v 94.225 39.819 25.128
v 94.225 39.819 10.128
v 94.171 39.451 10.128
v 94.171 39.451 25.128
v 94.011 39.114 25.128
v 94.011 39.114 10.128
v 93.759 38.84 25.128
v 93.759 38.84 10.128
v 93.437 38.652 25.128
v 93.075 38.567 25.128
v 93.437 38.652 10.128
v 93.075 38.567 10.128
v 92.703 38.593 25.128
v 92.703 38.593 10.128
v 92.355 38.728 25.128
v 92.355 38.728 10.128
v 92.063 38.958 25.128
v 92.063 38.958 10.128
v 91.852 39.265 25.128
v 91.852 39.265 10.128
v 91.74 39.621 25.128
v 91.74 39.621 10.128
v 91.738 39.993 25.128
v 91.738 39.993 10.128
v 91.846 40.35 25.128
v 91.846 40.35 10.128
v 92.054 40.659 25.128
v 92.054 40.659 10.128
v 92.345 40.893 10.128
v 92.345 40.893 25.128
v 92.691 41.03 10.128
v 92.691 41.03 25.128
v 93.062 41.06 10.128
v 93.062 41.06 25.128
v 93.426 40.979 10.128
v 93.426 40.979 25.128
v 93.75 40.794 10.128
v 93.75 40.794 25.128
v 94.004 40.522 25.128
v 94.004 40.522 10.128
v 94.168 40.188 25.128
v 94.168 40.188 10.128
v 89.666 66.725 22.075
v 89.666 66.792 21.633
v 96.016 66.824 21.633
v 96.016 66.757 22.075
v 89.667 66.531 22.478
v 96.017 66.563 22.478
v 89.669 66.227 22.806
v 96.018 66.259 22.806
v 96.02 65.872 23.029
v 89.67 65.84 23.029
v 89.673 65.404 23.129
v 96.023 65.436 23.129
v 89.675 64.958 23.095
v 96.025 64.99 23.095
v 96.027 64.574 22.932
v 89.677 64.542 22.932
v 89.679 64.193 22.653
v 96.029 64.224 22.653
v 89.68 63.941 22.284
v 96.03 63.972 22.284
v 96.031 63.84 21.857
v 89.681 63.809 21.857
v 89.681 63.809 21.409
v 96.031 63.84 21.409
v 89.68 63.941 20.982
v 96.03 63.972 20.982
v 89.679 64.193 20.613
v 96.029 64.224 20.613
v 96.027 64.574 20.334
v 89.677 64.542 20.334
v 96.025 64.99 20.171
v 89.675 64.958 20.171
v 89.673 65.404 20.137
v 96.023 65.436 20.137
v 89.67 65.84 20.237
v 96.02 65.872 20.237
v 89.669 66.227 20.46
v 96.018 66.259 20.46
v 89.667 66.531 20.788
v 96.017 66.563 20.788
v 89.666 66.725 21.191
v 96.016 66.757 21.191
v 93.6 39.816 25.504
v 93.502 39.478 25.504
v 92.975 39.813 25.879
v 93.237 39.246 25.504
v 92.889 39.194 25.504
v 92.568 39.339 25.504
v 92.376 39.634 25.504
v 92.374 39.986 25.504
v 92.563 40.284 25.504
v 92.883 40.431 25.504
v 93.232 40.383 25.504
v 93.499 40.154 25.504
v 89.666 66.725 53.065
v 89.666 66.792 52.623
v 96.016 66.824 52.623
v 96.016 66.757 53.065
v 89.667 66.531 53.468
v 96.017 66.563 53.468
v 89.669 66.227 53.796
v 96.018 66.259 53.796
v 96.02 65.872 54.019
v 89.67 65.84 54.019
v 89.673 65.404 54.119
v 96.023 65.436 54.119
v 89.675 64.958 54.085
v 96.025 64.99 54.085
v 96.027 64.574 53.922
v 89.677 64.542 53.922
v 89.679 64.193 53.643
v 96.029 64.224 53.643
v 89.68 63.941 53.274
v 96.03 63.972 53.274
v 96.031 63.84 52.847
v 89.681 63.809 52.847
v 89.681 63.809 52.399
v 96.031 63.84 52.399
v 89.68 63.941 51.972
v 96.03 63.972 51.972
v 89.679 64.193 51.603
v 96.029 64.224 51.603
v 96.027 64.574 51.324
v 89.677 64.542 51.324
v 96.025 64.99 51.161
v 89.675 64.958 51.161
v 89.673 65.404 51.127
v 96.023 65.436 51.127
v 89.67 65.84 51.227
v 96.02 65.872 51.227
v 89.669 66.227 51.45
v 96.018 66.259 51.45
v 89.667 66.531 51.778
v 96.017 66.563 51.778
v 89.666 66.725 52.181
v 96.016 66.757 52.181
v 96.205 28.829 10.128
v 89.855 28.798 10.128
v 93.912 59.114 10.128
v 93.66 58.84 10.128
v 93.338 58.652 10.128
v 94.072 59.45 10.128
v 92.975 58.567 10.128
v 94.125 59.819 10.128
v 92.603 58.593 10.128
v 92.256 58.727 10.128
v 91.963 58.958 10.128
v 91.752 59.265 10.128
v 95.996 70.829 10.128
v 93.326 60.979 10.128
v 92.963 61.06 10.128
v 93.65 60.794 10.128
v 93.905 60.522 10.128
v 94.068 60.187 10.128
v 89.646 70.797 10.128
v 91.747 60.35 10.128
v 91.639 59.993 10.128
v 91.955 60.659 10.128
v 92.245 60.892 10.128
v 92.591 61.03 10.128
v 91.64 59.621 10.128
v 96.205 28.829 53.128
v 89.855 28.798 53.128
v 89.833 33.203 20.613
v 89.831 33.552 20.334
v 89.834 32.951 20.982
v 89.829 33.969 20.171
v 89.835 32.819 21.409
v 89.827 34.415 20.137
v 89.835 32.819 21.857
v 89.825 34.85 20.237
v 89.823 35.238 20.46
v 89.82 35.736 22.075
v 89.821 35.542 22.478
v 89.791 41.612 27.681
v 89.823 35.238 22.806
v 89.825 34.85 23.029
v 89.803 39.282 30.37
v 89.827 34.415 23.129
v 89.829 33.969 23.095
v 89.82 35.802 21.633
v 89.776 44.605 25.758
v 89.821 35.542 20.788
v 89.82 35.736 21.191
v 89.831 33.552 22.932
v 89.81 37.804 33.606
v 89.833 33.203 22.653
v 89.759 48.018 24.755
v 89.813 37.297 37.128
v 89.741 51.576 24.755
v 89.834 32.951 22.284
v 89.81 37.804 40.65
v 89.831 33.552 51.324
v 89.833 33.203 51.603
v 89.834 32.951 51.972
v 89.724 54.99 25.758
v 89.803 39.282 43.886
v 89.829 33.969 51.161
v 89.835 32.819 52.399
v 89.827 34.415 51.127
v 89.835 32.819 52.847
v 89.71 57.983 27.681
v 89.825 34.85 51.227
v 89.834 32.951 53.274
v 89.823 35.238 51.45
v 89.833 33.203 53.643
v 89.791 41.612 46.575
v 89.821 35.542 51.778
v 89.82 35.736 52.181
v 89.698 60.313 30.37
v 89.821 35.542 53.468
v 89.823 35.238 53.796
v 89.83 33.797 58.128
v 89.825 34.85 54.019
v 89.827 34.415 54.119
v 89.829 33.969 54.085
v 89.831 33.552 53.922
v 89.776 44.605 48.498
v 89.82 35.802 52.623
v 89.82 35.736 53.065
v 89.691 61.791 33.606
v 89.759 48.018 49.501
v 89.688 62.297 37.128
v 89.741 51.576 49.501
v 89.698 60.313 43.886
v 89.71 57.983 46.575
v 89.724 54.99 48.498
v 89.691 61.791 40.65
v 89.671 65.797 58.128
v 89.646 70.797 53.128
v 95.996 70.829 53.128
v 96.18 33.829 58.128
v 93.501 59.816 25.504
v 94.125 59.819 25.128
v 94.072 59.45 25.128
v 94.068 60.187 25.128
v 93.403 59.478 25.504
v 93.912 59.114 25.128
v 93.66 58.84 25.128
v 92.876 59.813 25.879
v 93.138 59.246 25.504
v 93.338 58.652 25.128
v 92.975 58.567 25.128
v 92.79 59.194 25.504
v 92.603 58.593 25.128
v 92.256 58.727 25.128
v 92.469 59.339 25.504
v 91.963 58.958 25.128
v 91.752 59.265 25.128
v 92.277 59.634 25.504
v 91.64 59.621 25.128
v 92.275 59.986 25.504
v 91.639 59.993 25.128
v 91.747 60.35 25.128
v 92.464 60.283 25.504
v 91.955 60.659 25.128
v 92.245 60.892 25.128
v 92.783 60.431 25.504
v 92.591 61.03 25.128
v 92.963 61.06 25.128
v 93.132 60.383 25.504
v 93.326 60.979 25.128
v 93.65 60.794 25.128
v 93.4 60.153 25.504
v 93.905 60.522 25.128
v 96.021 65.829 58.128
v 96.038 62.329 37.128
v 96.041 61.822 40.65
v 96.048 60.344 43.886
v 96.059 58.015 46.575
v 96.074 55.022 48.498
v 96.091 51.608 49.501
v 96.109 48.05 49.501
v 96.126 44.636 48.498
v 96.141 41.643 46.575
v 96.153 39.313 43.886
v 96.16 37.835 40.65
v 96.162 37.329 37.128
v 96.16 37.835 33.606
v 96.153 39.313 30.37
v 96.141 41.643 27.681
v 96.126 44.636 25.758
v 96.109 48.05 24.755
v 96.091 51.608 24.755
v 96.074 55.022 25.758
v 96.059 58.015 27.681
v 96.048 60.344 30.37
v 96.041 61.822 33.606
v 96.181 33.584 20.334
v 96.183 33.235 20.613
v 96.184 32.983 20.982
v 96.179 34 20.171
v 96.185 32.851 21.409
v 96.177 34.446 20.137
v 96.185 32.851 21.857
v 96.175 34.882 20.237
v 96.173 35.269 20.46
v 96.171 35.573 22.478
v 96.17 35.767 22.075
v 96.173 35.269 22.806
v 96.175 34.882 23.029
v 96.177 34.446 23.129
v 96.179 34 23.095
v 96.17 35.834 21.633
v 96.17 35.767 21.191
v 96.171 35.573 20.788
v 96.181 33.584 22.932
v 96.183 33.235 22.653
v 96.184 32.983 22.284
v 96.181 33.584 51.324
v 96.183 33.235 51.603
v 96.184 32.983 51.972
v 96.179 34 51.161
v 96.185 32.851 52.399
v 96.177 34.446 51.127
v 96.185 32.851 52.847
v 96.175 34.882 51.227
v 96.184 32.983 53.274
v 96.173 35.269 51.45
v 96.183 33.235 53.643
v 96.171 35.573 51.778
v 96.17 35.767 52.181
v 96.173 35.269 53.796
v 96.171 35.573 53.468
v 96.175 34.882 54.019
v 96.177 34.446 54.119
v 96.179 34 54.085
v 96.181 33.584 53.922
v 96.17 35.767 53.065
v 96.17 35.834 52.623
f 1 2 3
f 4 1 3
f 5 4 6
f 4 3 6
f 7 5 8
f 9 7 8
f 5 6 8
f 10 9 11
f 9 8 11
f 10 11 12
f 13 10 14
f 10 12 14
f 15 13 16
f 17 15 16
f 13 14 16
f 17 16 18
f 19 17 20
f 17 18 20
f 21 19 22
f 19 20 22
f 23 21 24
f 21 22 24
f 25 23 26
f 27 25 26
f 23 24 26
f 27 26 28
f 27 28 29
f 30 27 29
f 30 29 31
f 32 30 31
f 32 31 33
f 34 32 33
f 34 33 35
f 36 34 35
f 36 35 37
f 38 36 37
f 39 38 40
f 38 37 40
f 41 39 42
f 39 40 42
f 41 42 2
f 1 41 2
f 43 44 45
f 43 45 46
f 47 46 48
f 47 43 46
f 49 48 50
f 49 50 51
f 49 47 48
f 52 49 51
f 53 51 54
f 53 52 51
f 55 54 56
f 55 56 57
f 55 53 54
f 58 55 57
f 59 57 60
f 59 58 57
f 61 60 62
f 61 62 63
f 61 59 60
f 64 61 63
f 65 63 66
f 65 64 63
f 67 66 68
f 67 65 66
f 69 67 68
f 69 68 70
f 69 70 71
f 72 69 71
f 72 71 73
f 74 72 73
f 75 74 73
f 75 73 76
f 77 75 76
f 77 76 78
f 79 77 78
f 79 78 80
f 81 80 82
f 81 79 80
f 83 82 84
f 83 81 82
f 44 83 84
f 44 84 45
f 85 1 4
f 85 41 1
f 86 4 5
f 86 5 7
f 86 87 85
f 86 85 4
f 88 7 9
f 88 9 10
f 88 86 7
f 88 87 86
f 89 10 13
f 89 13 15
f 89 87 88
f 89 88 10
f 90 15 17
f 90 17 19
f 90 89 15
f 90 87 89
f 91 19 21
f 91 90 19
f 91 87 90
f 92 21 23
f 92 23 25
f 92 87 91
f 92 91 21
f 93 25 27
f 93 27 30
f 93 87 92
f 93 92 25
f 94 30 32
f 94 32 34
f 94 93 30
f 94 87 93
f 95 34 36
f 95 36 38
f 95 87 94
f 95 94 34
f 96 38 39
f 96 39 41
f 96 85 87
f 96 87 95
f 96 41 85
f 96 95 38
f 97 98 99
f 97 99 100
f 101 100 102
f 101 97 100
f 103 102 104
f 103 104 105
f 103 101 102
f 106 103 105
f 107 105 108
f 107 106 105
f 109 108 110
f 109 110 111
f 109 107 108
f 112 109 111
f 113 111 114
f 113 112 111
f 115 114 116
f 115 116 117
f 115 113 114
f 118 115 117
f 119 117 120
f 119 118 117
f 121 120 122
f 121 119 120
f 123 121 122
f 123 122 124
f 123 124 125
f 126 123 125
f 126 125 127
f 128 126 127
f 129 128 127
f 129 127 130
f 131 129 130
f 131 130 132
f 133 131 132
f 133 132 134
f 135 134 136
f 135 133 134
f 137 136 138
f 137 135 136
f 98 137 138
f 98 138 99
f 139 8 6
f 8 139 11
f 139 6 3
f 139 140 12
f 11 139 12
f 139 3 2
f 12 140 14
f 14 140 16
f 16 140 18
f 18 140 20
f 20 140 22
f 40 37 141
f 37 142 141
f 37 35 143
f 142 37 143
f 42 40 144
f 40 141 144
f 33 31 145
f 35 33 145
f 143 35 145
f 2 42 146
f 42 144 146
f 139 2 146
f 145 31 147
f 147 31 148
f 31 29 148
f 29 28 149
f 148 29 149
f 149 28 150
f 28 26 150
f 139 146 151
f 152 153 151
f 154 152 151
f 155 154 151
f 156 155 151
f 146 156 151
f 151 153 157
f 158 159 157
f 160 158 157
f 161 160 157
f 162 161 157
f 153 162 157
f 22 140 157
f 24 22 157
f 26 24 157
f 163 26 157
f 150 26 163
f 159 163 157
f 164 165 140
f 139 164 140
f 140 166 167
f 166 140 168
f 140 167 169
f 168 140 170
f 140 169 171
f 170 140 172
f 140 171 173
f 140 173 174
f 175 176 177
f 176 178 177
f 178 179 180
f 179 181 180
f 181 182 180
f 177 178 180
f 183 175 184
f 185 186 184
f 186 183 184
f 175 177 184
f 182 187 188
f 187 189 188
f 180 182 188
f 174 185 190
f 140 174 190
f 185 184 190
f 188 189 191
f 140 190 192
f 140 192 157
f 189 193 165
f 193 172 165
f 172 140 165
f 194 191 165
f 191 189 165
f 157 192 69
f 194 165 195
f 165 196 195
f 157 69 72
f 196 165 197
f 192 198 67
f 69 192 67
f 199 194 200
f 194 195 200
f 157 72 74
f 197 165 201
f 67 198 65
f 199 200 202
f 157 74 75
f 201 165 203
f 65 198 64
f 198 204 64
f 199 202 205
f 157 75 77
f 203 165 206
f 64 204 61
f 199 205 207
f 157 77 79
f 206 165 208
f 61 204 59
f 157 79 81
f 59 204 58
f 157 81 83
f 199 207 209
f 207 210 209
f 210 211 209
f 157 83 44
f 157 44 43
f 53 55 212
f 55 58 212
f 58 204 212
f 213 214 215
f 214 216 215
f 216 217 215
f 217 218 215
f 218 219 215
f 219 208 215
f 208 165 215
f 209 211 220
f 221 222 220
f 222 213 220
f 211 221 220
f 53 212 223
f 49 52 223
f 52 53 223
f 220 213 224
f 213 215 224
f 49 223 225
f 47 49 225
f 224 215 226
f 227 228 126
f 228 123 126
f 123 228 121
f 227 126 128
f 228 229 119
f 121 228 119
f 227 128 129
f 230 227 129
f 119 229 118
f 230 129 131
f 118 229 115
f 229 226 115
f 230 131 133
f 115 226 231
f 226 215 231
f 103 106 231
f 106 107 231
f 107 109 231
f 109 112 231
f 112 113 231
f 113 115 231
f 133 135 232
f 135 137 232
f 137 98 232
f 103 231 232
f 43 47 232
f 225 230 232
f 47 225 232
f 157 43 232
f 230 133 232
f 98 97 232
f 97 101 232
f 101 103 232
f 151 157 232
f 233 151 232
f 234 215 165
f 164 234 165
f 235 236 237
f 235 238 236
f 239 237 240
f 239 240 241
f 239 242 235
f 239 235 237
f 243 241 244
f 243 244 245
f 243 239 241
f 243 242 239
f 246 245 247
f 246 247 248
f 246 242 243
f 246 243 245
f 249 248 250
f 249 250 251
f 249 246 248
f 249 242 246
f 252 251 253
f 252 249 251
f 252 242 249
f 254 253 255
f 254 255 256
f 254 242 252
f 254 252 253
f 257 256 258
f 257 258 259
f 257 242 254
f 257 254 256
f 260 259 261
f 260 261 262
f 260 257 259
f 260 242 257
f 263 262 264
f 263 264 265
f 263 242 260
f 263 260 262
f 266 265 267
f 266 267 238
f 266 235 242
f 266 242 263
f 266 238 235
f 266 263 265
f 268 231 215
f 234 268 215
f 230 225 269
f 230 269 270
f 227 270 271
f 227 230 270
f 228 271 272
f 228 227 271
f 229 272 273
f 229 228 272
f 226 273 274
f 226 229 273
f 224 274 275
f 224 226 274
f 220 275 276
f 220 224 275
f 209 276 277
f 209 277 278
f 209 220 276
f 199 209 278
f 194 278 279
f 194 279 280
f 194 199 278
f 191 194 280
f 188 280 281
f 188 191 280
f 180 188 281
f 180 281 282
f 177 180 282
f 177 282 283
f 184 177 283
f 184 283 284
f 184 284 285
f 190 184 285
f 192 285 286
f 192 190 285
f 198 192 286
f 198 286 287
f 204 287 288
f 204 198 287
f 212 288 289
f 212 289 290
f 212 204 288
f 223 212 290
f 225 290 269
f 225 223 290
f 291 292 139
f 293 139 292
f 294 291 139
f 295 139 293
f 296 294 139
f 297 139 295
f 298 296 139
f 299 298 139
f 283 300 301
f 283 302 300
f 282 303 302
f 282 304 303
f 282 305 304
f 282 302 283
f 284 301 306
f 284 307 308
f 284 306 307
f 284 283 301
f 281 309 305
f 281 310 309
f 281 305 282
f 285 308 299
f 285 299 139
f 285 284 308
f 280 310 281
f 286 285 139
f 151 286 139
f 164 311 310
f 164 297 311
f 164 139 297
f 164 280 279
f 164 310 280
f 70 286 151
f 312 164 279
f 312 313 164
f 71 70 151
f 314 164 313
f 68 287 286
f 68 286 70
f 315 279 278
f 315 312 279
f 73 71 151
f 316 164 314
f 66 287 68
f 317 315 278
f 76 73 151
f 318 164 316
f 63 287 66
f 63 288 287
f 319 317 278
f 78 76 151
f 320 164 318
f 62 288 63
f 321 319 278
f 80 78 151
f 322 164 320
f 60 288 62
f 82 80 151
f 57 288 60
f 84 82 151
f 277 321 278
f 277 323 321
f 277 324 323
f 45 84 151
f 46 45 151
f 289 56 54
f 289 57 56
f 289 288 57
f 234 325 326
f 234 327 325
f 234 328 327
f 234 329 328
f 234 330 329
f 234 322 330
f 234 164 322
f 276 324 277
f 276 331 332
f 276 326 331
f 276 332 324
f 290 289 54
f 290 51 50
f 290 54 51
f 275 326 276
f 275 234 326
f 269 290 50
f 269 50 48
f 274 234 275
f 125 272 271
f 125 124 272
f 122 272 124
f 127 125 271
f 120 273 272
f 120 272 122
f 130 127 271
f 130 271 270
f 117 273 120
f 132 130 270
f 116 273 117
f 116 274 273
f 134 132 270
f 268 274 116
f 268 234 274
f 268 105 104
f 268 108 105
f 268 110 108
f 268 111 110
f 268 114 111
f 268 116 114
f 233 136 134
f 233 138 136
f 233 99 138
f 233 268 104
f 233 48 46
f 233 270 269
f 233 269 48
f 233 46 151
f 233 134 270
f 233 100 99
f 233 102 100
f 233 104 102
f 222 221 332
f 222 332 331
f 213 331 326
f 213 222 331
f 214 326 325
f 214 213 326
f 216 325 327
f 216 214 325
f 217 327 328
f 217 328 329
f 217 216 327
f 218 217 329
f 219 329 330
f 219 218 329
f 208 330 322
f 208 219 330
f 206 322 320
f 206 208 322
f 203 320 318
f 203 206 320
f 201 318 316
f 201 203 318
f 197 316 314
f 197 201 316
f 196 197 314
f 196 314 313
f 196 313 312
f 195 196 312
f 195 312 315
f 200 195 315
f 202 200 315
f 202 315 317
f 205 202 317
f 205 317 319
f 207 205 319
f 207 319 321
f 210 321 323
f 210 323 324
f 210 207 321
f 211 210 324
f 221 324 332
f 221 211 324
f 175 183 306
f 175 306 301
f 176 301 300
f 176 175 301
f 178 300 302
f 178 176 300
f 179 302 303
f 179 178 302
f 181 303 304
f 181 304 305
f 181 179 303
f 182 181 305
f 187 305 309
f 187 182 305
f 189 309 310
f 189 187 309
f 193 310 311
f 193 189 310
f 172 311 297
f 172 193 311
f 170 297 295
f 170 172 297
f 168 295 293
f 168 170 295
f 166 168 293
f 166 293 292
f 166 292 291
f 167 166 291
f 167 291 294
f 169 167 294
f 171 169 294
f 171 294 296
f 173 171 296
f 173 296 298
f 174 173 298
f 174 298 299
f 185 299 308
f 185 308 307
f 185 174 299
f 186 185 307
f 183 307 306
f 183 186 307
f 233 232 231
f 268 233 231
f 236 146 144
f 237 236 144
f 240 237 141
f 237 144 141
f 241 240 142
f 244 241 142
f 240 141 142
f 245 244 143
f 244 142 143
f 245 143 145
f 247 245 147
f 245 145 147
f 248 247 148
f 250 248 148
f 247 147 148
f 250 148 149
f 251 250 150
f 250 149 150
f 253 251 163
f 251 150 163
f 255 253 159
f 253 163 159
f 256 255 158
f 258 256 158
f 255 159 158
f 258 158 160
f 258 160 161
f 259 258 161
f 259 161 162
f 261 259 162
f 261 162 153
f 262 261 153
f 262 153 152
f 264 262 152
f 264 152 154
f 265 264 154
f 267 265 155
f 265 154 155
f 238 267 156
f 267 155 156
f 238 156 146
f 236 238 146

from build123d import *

# Parameters (mm, degrees)
SKETCH_R             = 12.5
SKETCH_R_2           = 1.5
PAD_DEPTH            = 6.35
SKETCH011_R          = 1.25
HOLE_DEPTH           = 15
HOLE_TIPS_R          = 1.25
BODY_PLACEMENT_ANGLE = 0.285111


with BuildPart() as part:
    # Sketch → Pad (new body)
    with BuildSketch(Plane.YZ):
        Polygon((-21, -27), (21, -27), (21, 16), (16, 21), (-16, 21), (-21, 16), align=None)
        Circle(SKETCH_R, mode=Mode.SUBTRACT)
        with Locations((15.495, 15.495)):
            Circle(SKETCH_R_2, mode=Mode.SUBTRACT)
        with Locations((15.495, -15.495)):
            Circle(SKETCH_R_2, mode=Mode.SUBTRACT)
        with Locations((-15.495, -15.495)):
            Circle(SKETCH_R_2, mode=Mode.SUBTRACT)
        with Locations((-15.495, 15.495)):
            Circle(SKETCH_R_2, mode=Mode.SUBTRACT)
    extrude(amount=PAD_DEPTH)

    # Sketch011 (on Face4 of Pad) → Hole (cut)
    with BuildSketch(Plane(origin=(0, 0, -27), x_dir=(1, 0, 0), z_dir=(0, 0, -1))):
        with Locations((3.175, 10)):
            Circle(SKETCH011_R)
        with Locations((3.175, -10)):
            Circle(SKETCH011_R)
    extrude(amount=-HOLE_DEPTH, mode=Mode.SUBTRACT)

    # Hole tips → Hole tip 1 section 0
    with BuildSketch(Plane(origin=(0, 0, -12), x_dir=(1, 0, 0), z_dir=(0, 0, -1)), mode=Mode.PRIVATE) as hole_tip_1_s0:
        with Locations((3.175, 10)):
            Circle(HOLE_TIPS_R)
    loft([hole_tip_1_s0.sketch, Vertex(3.175, -10, -11.248924)], mode=Mode.SUBTRACT)

    # Hole tips → Hole tip 2 section 0
    with BuildSketch(Plane(origin=(0, 0, -12), x_dir=(1, 0, 0), z_dir=(0, 0, -1)), mode=Mode.PRIVATE) as hole_tip_2_s0:
        with Locations((3.175, -10)):
            Circle(HOLE_TIPS_R)
    loft([hole_tip_2_s0.sketch, Vertex(3.175, 10, -11.248924)], mode=Mode.SUBTRACT)


with BuildPart() as part_1:
    # Body placement: moved
    add(part.part.moved(Location((89.750311, 49.797284, 37.128014))).rotate(Axis((89.750311, 49.797284, 37.128014), (0, 0, 1)), BODY_PLACEMENT_ANGLE))


solid = part_1.part
